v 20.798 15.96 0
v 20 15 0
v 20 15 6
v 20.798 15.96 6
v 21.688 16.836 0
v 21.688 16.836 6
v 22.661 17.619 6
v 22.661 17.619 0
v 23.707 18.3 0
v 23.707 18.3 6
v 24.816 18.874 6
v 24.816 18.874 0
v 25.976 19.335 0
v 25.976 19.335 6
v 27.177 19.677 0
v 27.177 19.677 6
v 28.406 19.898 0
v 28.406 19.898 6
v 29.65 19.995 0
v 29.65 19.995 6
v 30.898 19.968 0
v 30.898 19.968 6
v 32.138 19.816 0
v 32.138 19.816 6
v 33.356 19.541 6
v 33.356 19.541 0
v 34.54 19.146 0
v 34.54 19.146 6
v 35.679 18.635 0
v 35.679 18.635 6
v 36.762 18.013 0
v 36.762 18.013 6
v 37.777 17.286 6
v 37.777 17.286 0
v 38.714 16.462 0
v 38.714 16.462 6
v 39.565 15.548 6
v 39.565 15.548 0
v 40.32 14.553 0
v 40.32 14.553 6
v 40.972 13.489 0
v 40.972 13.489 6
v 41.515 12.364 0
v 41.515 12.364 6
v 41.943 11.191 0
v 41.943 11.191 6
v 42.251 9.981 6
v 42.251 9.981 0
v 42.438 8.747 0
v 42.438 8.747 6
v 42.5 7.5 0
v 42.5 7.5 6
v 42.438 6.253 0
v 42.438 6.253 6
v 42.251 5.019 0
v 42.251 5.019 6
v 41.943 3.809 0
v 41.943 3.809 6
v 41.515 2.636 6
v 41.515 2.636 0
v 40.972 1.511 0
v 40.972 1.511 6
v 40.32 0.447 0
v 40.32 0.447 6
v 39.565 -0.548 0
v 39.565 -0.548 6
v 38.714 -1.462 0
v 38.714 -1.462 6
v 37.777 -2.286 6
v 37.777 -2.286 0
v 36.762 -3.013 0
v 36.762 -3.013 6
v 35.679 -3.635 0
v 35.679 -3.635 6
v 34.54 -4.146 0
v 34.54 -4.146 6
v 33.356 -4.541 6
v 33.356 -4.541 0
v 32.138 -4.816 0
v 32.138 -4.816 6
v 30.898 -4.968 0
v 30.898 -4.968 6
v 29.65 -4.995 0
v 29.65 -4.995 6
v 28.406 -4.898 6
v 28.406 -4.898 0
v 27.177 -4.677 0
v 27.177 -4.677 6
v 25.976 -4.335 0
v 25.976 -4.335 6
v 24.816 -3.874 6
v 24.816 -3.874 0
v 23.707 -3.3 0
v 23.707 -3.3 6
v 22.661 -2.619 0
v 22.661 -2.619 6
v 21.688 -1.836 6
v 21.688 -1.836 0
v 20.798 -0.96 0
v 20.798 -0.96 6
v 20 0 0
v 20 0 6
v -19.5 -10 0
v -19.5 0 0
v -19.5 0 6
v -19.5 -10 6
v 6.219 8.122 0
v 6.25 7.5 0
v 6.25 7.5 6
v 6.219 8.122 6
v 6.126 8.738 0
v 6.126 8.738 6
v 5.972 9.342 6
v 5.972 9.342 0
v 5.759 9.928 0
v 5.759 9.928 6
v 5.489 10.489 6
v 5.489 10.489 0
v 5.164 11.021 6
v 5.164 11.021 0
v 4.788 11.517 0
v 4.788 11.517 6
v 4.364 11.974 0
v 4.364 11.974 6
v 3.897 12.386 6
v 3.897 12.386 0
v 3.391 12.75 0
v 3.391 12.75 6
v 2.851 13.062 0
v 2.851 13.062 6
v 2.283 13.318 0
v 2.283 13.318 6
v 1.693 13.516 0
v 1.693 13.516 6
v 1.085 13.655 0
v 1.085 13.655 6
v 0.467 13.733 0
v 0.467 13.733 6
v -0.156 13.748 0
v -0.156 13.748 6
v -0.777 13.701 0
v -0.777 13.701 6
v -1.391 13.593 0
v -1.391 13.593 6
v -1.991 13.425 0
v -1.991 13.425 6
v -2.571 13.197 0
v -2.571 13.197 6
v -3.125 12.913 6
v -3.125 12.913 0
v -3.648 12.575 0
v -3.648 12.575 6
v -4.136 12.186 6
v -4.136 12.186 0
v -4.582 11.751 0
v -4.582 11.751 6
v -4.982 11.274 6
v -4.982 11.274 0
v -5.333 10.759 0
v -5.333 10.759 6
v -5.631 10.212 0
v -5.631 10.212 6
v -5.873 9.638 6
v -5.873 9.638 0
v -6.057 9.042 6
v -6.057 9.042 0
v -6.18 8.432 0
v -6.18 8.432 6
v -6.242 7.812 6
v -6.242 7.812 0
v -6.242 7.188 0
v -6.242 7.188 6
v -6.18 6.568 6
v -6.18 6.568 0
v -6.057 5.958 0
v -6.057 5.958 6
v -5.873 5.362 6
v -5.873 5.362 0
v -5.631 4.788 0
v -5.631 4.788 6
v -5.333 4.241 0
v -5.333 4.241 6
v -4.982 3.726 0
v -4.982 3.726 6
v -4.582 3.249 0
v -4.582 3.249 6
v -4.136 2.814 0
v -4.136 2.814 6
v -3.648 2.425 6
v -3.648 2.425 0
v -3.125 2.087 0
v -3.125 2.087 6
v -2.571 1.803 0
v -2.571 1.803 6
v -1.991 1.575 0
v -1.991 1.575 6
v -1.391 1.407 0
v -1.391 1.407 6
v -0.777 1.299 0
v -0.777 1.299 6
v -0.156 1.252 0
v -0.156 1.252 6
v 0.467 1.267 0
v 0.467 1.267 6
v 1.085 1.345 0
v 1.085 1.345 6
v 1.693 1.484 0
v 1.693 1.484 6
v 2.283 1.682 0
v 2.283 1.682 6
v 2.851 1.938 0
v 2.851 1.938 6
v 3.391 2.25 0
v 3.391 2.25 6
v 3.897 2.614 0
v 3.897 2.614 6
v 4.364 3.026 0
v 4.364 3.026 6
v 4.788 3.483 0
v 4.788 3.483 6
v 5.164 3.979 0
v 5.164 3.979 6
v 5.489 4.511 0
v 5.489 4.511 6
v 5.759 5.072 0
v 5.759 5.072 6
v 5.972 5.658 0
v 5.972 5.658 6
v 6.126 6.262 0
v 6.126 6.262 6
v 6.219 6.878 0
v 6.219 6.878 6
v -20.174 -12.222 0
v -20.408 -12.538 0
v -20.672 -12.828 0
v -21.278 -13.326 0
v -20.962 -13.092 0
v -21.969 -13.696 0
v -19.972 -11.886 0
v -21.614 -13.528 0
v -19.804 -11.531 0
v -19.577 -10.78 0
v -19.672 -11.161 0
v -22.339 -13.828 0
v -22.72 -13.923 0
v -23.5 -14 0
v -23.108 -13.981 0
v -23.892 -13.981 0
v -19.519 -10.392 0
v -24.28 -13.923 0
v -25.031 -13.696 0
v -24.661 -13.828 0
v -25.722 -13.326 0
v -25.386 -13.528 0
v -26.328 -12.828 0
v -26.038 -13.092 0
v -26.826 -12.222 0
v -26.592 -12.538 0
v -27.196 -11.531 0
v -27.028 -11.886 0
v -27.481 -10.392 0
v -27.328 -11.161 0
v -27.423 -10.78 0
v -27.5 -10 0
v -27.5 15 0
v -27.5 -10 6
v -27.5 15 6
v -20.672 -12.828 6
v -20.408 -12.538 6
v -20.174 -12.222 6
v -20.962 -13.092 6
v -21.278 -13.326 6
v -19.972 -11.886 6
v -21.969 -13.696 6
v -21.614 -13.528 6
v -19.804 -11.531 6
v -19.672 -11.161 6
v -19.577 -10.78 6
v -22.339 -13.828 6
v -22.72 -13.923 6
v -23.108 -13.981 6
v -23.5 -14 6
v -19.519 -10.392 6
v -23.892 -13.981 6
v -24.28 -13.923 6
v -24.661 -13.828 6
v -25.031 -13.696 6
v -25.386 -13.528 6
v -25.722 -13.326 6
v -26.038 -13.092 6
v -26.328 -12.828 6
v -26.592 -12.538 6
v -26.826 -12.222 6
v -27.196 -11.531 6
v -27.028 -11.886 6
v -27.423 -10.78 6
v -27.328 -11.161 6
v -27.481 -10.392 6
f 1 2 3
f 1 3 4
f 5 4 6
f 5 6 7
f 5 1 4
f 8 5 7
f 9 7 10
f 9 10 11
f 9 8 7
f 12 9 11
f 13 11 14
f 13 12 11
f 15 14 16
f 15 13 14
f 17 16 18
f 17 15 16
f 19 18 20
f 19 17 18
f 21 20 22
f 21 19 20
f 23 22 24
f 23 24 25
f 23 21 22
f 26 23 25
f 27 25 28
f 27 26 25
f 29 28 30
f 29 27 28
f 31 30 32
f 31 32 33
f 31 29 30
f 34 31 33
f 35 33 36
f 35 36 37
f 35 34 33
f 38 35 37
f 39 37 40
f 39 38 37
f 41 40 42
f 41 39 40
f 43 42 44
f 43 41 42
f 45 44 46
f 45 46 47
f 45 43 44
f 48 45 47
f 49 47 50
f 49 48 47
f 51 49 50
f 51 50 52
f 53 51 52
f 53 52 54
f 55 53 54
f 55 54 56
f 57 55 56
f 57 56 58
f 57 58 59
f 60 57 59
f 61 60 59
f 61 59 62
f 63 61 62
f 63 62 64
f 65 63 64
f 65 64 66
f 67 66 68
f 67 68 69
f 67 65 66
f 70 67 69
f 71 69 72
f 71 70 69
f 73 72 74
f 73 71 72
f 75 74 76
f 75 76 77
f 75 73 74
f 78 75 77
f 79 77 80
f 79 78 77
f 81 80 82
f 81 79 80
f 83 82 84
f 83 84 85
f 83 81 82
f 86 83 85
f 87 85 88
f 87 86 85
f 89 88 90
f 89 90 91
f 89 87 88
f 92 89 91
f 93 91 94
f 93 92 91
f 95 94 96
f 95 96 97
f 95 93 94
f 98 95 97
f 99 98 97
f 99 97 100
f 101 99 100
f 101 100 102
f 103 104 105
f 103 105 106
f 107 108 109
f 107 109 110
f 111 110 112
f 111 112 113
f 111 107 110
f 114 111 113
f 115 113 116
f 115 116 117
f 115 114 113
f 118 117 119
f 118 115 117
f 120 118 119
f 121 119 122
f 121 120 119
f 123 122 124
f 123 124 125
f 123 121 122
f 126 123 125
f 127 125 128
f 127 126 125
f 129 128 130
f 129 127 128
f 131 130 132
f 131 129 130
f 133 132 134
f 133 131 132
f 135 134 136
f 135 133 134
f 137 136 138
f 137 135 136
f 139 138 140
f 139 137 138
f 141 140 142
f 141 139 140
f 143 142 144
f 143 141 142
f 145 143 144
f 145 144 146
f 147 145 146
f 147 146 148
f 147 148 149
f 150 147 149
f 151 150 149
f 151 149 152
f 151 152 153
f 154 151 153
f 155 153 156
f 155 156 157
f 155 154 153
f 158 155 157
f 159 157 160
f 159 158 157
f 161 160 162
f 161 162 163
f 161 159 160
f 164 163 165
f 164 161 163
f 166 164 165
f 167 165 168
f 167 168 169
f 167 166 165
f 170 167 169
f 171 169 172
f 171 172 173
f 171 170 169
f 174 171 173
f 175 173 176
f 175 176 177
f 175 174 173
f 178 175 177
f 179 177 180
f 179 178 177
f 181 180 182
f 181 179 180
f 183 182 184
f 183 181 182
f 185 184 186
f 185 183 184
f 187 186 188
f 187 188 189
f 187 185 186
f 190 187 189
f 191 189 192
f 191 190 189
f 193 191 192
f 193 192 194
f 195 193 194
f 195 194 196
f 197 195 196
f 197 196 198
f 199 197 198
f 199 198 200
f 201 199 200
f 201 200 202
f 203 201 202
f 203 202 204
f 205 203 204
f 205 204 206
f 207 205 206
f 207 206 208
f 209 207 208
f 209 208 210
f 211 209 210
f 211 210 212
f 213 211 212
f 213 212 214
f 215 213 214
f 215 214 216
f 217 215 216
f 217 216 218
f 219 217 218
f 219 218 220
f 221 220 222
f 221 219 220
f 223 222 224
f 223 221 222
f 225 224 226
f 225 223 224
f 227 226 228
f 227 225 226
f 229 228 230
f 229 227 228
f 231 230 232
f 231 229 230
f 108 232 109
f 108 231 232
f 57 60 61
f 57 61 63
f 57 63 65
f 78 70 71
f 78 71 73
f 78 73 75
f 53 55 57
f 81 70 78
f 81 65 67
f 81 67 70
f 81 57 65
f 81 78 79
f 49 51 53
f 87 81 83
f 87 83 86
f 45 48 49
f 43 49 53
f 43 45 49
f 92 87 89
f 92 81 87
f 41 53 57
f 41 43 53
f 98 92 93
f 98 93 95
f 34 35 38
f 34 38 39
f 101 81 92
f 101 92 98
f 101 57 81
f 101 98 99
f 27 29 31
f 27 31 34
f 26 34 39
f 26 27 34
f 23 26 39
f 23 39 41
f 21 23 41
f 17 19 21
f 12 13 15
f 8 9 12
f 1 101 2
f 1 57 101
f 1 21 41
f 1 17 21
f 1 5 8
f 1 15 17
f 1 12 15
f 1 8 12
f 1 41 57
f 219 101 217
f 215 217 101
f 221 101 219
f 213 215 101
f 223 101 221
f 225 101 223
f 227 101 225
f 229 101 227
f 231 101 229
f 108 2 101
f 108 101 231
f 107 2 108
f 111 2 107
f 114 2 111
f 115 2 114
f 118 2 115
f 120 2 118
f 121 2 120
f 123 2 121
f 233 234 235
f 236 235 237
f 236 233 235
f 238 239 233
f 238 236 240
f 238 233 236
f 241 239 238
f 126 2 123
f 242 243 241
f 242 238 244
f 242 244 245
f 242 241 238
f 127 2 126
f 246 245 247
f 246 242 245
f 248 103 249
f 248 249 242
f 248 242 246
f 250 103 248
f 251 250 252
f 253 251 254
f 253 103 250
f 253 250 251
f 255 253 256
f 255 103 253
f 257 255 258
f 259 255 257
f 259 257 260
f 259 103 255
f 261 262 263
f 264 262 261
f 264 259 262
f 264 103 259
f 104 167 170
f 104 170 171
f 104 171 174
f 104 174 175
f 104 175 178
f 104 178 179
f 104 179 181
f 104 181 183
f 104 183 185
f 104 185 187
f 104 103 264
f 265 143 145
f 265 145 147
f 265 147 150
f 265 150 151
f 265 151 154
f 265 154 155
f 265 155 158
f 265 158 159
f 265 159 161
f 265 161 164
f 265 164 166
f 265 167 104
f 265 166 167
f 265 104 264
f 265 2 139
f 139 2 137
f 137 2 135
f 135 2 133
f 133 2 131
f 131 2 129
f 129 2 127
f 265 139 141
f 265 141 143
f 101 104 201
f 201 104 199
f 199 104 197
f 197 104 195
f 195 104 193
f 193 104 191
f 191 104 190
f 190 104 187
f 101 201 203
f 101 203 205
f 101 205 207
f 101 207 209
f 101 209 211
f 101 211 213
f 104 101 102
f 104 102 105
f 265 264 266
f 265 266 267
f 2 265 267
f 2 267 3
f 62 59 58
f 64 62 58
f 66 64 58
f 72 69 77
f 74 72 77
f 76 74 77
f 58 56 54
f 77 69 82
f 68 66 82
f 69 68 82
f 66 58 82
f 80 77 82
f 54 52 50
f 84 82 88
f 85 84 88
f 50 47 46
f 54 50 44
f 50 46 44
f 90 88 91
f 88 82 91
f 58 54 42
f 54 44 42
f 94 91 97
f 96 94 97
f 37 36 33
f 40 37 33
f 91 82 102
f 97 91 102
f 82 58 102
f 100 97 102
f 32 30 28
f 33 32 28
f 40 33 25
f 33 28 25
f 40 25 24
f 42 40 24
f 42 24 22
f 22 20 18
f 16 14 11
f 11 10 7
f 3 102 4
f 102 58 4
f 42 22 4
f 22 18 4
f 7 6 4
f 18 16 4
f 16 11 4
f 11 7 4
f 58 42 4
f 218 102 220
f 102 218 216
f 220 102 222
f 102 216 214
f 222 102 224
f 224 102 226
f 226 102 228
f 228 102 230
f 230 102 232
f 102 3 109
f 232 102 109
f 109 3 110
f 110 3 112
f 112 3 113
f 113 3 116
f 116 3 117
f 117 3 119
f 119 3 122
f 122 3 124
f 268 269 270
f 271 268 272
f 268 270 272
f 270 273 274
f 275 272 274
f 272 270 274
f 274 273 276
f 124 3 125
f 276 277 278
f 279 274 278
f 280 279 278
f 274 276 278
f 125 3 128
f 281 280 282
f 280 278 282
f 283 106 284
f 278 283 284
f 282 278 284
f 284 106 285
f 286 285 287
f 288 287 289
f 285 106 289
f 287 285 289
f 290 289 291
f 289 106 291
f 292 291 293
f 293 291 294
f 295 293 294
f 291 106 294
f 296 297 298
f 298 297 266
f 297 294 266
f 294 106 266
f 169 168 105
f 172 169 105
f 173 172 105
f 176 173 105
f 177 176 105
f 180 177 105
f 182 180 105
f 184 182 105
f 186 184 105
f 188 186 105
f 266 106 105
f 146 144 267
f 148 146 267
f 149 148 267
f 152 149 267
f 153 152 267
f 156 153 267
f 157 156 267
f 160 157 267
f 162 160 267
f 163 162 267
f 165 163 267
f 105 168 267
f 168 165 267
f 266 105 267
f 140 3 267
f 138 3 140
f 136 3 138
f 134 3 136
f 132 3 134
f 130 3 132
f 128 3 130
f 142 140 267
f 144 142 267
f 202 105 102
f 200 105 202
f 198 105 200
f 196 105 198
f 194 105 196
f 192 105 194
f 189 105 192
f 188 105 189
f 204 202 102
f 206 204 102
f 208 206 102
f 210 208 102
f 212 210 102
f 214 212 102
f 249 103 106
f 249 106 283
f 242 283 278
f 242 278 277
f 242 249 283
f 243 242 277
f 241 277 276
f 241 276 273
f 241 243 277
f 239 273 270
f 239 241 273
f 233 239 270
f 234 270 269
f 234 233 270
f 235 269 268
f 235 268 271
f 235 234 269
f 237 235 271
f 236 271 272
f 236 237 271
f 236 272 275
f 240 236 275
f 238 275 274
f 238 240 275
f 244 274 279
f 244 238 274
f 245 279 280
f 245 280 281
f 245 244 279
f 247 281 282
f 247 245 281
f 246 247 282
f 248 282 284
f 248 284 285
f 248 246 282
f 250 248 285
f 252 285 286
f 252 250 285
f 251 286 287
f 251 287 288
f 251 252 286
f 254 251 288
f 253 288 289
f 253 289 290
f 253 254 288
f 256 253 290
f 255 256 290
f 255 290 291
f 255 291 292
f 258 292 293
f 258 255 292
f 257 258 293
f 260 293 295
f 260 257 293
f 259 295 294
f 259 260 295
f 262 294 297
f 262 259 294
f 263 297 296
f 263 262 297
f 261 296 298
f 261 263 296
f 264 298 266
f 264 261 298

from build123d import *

# Parameters (mm, degrees)
SCHIZZO1_R                   = 6.25
ESTRUSIONE_ESTRUSIONE1_DEPTH = 6


with BuildPart() as part:
    # Schizzo1 → Estrusione-Estrusione1 (new body)
    with BuildSketch(Plane.XY):
        with BuildLine():
            Line((0, 0), (-19.5, 0))
            Line((-19.5, 0), (-19.5, -10))
            ThreePointArc((-19.5, -10), (-23.5, -14), (-27.5, -10))
            Line((-27.5, -10), (-27.5, 15))
            Line((-27.5, 15), (8.032195982, 15))
            Line((8.032195982, 15), (20, 15))
            ThreePointArc((20, 15), (42.5, 7.5), (20, 0))
            Line((20, 0), (0, 0))
        make_face()
        with Locations((0, 7.5)):
            Circle(SCHIZZO1_R, mode=Mode.SUBTRACT)
    extrude(amount=ESTRUSIONE_ESTRUSIONE1_DEPTH)


solid = part.part
